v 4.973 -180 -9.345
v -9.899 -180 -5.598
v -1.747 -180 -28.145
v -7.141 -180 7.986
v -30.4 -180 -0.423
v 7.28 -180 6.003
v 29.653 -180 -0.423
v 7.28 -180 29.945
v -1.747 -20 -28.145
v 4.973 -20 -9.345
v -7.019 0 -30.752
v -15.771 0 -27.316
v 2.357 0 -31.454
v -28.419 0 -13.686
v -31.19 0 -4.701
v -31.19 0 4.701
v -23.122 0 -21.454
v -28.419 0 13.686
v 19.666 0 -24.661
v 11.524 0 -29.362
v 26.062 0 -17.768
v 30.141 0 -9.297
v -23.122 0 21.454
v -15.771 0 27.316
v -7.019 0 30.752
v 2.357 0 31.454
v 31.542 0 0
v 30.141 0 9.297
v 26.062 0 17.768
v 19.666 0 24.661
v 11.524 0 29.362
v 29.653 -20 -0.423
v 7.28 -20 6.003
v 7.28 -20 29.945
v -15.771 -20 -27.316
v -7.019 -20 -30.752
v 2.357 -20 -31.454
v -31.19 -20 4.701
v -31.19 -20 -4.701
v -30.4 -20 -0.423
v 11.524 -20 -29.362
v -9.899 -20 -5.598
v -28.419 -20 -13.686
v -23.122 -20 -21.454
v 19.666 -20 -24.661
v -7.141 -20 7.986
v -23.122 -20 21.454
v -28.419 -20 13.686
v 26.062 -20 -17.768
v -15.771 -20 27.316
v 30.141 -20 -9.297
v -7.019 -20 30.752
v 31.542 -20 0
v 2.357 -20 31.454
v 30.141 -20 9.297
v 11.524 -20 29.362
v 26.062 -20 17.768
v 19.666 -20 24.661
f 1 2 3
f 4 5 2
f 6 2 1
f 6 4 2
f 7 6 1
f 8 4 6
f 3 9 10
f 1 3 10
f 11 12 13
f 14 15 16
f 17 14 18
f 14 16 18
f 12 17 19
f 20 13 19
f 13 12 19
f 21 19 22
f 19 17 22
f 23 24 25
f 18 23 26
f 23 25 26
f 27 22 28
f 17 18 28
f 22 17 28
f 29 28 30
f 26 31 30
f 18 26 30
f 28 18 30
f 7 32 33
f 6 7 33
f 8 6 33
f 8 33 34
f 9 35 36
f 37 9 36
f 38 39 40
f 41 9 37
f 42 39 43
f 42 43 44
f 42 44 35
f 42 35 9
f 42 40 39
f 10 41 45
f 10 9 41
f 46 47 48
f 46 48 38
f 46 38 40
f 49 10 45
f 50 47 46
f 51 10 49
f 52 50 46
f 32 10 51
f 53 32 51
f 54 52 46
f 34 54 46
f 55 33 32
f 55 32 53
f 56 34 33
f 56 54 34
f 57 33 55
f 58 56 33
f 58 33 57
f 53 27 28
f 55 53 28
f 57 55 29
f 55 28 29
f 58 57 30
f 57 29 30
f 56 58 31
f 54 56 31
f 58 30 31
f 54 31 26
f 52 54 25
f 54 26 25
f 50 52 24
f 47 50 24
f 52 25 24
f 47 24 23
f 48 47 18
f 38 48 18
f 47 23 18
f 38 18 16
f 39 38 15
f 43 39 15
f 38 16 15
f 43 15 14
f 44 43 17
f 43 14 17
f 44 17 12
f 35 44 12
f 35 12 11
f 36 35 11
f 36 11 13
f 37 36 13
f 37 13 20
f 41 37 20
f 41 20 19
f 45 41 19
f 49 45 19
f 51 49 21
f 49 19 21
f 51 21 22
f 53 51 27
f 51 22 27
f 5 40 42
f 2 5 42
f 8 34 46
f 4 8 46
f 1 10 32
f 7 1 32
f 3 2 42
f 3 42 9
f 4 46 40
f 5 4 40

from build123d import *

# Parameters (mm, degrees)
F1_DEPTH = 180
F2_R     = 31.542376
F3_DEPTH = 20


with BuildPart() as f1:
    # F0 (on Front) → F1 (new body)
    with BuildSketch(Plane.XZ):
        Polygon((7.28047, 6.002584), (7.28047, 29.945172), (-7.141014, 7.986175), (-30.399669, -0.422769), (-9.899175, -5.597863), (-1.747458, -28.145044), (4.973325, -9.345488), (29.653051, -0.422769), align=None)
    extrude(amount=F1_DEPTH)

    # F2 (on face) → F3 (join)
    with BuildSketch(Plane.XZ):
        Circle(F2_R)
    extrude(amount=F3_DEPTH)


solid = f1.part
